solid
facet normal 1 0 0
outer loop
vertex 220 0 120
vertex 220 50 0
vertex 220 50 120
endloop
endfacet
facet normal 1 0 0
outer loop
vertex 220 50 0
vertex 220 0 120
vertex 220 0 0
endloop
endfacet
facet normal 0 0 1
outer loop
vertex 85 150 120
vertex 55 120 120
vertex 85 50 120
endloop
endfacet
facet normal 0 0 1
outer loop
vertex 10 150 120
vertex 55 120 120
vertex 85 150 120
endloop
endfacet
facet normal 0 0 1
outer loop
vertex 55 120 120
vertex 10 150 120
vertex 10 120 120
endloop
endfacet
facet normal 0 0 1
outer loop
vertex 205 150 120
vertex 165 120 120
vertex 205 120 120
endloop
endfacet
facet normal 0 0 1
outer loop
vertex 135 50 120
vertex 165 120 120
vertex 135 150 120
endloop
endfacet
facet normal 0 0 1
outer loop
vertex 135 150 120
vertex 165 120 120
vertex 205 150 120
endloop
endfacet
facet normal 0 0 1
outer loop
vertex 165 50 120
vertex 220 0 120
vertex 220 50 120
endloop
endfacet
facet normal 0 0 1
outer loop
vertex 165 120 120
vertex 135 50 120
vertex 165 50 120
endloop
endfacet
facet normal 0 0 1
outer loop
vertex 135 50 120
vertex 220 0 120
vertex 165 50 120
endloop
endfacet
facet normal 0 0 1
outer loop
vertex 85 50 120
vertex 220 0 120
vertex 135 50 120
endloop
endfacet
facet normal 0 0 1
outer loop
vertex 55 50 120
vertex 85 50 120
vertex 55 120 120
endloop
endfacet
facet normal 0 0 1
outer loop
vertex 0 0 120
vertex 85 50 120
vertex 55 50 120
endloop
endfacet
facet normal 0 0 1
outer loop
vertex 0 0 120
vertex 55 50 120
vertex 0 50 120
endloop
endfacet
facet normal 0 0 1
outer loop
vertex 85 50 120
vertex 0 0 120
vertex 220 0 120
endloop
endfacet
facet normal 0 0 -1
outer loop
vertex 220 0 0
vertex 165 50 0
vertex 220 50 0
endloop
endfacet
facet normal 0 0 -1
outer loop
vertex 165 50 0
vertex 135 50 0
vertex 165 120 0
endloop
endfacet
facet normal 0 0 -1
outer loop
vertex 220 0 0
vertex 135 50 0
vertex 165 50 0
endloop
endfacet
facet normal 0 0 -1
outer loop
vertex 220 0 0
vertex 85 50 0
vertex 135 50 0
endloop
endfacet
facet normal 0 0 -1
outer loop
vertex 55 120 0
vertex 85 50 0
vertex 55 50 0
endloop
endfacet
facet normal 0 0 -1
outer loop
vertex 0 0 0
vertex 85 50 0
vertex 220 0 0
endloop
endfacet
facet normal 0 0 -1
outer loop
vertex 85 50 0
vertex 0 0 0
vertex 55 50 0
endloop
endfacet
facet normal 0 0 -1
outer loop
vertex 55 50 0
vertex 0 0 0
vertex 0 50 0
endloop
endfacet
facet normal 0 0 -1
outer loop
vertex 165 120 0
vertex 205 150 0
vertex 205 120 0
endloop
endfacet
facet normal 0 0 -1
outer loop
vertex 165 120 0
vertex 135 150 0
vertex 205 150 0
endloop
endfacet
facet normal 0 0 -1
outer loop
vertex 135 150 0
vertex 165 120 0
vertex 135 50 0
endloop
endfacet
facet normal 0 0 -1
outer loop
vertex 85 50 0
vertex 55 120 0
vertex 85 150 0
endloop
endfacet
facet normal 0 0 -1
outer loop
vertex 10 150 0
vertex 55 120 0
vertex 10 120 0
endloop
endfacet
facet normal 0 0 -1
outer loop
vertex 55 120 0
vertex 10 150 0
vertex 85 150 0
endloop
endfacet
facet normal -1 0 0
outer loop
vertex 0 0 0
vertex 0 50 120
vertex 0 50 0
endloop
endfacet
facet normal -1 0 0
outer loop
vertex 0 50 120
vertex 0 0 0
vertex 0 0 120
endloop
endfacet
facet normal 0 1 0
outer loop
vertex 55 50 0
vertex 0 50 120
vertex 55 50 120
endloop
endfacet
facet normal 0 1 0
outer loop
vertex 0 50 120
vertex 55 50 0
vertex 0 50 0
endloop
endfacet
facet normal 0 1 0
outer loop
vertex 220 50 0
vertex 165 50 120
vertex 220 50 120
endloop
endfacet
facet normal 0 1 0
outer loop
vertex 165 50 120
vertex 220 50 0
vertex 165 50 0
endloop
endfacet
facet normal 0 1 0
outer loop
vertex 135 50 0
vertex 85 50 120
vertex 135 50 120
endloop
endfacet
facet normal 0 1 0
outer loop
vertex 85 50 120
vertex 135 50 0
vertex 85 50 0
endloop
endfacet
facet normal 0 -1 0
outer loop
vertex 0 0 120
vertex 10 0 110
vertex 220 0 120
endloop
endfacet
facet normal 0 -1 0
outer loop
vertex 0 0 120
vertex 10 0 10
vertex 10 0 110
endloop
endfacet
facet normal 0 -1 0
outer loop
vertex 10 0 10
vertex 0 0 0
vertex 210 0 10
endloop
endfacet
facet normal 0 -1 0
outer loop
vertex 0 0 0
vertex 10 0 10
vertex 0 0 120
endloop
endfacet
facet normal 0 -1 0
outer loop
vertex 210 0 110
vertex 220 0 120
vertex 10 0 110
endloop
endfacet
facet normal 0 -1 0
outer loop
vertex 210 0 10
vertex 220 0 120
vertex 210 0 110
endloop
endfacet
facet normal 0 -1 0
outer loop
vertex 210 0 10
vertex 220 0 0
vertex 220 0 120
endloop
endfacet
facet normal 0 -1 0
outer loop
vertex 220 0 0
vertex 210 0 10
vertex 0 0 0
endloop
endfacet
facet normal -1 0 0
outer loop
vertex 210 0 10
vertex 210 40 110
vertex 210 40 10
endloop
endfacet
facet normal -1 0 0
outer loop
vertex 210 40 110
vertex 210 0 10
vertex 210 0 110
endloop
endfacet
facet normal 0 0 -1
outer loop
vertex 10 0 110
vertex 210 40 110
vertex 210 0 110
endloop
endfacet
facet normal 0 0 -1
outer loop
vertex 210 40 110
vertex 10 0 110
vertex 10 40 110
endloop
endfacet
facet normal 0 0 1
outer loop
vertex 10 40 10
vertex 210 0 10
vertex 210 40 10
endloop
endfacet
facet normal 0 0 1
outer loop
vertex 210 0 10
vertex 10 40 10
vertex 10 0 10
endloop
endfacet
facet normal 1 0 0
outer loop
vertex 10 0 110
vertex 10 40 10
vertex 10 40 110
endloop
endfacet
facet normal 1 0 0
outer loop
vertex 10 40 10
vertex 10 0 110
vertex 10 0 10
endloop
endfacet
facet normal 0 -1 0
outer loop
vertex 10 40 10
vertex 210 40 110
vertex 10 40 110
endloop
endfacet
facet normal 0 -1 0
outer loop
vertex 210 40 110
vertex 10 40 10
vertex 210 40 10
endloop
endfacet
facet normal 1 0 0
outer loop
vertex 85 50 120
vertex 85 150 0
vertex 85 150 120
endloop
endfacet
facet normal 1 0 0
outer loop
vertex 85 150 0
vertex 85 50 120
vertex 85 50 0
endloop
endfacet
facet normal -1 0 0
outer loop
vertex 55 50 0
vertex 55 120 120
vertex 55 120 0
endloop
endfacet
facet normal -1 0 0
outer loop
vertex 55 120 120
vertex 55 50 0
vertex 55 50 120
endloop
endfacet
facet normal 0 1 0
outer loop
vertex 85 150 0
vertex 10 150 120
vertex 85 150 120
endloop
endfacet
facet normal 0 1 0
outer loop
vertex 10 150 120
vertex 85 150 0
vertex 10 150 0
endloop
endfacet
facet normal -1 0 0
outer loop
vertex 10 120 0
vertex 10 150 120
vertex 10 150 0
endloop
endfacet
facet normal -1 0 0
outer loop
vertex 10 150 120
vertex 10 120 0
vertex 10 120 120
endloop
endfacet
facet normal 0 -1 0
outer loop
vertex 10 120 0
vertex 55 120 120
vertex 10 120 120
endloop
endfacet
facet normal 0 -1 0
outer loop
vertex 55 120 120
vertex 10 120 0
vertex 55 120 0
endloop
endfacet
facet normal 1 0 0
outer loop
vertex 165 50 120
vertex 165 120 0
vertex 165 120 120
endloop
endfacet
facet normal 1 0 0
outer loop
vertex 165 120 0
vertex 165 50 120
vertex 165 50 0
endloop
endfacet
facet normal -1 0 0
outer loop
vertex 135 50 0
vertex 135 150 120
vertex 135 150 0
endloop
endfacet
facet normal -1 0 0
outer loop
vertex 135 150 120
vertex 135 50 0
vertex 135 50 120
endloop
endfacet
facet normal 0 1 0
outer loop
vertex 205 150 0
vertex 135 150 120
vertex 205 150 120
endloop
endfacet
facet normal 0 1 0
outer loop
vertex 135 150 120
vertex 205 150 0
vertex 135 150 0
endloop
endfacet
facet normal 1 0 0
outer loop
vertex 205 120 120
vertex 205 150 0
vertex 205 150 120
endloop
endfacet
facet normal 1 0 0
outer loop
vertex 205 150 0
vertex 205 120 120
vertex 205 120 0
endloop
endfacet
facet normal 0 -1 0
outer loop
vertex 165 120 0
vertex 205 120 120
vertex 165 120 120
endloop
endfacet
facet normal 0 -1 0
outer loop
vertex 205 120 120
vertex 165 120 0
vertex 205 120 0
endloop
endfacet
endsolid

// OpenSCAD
h = 100;
w = 200;
t = 10;
pants_h = 50;

leg_h = 100;
leg_t = 30;
shoe_l = 50;

difference(){
	cube([w+2*t,pants_h,h+2*t]);
	translate([t,-t,t])
	cube([w,pants_h,h]);
}
translate([(w+2*t)/4,pants_h,0])
cube([leg_t,leg_h,h+2*t]);
translate([t,leg_h+2*t,0])
cube([shoe_l,leg_t,h+2*t]);

translate([3*(w+2*t)/4-leg_t,pants_h,0])
cube([leg_t,leg_h,h+2*t]);
translate([3*(w+2*t)/4-t,leg_h+2*t,0])
cube([shoe_l,leg_t,h+2*t]);
